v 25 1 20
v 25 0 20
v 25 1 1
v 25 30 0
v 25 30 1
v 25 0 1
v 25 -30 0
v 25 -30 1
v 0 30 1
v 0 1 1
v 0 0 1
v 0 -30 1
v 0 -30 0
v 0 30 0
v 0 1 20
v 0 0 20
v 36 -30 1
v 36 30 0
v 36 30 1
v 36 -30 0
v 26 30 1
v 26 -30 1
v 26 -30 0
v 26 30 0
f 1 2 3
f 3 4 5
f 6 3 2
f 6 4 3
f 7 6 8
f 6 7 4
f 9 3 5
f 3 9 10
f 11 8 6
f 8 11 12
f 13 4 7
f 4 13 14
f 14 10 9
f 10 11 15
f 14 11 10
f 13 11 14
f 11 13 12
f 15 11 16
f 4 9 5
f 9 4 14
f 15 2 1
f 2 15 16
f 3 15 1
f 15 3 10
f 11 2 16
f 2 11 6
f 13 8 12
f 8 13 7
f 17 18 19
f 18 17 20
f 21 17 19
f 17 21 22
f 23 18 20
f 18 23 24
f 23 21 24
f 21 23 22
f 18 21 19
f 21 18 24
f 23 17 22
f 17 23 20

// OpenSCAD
// Copyright 2013 Peter Withers
// Licensed as GPL 2

module empennageCard(height, span, chord, elevatorChord){
	cube([chord,span,1]);
	cube([chord,1,height]);
	translate([0,-span,0])cube([chord,span,1]);
	elevator(height, span, chord,elevatorChord);
}

module empennageStruts(height, span, chord){
	horizontalStabiliser(height, span, chord);
	verticalStabiliser(height, span, chord);
	translate([0,-span,0])horizontalStabiliser(height, span, chord);
}

module verticalStabiliser(height, span, chord){
	cube([chord,1,height]);
}

module horizontalStabiliser(height, span, chord){
	cube([chord,span,1]);
}

module elevator(height, span, chord, elevatorChord){
	translate([chord+1,-span,0]) cube([elevatorChord,span*2,1]);
}

empennageCard(20, 30, 25, 10);
//empennageStruts(20, 30, 25, 10);
